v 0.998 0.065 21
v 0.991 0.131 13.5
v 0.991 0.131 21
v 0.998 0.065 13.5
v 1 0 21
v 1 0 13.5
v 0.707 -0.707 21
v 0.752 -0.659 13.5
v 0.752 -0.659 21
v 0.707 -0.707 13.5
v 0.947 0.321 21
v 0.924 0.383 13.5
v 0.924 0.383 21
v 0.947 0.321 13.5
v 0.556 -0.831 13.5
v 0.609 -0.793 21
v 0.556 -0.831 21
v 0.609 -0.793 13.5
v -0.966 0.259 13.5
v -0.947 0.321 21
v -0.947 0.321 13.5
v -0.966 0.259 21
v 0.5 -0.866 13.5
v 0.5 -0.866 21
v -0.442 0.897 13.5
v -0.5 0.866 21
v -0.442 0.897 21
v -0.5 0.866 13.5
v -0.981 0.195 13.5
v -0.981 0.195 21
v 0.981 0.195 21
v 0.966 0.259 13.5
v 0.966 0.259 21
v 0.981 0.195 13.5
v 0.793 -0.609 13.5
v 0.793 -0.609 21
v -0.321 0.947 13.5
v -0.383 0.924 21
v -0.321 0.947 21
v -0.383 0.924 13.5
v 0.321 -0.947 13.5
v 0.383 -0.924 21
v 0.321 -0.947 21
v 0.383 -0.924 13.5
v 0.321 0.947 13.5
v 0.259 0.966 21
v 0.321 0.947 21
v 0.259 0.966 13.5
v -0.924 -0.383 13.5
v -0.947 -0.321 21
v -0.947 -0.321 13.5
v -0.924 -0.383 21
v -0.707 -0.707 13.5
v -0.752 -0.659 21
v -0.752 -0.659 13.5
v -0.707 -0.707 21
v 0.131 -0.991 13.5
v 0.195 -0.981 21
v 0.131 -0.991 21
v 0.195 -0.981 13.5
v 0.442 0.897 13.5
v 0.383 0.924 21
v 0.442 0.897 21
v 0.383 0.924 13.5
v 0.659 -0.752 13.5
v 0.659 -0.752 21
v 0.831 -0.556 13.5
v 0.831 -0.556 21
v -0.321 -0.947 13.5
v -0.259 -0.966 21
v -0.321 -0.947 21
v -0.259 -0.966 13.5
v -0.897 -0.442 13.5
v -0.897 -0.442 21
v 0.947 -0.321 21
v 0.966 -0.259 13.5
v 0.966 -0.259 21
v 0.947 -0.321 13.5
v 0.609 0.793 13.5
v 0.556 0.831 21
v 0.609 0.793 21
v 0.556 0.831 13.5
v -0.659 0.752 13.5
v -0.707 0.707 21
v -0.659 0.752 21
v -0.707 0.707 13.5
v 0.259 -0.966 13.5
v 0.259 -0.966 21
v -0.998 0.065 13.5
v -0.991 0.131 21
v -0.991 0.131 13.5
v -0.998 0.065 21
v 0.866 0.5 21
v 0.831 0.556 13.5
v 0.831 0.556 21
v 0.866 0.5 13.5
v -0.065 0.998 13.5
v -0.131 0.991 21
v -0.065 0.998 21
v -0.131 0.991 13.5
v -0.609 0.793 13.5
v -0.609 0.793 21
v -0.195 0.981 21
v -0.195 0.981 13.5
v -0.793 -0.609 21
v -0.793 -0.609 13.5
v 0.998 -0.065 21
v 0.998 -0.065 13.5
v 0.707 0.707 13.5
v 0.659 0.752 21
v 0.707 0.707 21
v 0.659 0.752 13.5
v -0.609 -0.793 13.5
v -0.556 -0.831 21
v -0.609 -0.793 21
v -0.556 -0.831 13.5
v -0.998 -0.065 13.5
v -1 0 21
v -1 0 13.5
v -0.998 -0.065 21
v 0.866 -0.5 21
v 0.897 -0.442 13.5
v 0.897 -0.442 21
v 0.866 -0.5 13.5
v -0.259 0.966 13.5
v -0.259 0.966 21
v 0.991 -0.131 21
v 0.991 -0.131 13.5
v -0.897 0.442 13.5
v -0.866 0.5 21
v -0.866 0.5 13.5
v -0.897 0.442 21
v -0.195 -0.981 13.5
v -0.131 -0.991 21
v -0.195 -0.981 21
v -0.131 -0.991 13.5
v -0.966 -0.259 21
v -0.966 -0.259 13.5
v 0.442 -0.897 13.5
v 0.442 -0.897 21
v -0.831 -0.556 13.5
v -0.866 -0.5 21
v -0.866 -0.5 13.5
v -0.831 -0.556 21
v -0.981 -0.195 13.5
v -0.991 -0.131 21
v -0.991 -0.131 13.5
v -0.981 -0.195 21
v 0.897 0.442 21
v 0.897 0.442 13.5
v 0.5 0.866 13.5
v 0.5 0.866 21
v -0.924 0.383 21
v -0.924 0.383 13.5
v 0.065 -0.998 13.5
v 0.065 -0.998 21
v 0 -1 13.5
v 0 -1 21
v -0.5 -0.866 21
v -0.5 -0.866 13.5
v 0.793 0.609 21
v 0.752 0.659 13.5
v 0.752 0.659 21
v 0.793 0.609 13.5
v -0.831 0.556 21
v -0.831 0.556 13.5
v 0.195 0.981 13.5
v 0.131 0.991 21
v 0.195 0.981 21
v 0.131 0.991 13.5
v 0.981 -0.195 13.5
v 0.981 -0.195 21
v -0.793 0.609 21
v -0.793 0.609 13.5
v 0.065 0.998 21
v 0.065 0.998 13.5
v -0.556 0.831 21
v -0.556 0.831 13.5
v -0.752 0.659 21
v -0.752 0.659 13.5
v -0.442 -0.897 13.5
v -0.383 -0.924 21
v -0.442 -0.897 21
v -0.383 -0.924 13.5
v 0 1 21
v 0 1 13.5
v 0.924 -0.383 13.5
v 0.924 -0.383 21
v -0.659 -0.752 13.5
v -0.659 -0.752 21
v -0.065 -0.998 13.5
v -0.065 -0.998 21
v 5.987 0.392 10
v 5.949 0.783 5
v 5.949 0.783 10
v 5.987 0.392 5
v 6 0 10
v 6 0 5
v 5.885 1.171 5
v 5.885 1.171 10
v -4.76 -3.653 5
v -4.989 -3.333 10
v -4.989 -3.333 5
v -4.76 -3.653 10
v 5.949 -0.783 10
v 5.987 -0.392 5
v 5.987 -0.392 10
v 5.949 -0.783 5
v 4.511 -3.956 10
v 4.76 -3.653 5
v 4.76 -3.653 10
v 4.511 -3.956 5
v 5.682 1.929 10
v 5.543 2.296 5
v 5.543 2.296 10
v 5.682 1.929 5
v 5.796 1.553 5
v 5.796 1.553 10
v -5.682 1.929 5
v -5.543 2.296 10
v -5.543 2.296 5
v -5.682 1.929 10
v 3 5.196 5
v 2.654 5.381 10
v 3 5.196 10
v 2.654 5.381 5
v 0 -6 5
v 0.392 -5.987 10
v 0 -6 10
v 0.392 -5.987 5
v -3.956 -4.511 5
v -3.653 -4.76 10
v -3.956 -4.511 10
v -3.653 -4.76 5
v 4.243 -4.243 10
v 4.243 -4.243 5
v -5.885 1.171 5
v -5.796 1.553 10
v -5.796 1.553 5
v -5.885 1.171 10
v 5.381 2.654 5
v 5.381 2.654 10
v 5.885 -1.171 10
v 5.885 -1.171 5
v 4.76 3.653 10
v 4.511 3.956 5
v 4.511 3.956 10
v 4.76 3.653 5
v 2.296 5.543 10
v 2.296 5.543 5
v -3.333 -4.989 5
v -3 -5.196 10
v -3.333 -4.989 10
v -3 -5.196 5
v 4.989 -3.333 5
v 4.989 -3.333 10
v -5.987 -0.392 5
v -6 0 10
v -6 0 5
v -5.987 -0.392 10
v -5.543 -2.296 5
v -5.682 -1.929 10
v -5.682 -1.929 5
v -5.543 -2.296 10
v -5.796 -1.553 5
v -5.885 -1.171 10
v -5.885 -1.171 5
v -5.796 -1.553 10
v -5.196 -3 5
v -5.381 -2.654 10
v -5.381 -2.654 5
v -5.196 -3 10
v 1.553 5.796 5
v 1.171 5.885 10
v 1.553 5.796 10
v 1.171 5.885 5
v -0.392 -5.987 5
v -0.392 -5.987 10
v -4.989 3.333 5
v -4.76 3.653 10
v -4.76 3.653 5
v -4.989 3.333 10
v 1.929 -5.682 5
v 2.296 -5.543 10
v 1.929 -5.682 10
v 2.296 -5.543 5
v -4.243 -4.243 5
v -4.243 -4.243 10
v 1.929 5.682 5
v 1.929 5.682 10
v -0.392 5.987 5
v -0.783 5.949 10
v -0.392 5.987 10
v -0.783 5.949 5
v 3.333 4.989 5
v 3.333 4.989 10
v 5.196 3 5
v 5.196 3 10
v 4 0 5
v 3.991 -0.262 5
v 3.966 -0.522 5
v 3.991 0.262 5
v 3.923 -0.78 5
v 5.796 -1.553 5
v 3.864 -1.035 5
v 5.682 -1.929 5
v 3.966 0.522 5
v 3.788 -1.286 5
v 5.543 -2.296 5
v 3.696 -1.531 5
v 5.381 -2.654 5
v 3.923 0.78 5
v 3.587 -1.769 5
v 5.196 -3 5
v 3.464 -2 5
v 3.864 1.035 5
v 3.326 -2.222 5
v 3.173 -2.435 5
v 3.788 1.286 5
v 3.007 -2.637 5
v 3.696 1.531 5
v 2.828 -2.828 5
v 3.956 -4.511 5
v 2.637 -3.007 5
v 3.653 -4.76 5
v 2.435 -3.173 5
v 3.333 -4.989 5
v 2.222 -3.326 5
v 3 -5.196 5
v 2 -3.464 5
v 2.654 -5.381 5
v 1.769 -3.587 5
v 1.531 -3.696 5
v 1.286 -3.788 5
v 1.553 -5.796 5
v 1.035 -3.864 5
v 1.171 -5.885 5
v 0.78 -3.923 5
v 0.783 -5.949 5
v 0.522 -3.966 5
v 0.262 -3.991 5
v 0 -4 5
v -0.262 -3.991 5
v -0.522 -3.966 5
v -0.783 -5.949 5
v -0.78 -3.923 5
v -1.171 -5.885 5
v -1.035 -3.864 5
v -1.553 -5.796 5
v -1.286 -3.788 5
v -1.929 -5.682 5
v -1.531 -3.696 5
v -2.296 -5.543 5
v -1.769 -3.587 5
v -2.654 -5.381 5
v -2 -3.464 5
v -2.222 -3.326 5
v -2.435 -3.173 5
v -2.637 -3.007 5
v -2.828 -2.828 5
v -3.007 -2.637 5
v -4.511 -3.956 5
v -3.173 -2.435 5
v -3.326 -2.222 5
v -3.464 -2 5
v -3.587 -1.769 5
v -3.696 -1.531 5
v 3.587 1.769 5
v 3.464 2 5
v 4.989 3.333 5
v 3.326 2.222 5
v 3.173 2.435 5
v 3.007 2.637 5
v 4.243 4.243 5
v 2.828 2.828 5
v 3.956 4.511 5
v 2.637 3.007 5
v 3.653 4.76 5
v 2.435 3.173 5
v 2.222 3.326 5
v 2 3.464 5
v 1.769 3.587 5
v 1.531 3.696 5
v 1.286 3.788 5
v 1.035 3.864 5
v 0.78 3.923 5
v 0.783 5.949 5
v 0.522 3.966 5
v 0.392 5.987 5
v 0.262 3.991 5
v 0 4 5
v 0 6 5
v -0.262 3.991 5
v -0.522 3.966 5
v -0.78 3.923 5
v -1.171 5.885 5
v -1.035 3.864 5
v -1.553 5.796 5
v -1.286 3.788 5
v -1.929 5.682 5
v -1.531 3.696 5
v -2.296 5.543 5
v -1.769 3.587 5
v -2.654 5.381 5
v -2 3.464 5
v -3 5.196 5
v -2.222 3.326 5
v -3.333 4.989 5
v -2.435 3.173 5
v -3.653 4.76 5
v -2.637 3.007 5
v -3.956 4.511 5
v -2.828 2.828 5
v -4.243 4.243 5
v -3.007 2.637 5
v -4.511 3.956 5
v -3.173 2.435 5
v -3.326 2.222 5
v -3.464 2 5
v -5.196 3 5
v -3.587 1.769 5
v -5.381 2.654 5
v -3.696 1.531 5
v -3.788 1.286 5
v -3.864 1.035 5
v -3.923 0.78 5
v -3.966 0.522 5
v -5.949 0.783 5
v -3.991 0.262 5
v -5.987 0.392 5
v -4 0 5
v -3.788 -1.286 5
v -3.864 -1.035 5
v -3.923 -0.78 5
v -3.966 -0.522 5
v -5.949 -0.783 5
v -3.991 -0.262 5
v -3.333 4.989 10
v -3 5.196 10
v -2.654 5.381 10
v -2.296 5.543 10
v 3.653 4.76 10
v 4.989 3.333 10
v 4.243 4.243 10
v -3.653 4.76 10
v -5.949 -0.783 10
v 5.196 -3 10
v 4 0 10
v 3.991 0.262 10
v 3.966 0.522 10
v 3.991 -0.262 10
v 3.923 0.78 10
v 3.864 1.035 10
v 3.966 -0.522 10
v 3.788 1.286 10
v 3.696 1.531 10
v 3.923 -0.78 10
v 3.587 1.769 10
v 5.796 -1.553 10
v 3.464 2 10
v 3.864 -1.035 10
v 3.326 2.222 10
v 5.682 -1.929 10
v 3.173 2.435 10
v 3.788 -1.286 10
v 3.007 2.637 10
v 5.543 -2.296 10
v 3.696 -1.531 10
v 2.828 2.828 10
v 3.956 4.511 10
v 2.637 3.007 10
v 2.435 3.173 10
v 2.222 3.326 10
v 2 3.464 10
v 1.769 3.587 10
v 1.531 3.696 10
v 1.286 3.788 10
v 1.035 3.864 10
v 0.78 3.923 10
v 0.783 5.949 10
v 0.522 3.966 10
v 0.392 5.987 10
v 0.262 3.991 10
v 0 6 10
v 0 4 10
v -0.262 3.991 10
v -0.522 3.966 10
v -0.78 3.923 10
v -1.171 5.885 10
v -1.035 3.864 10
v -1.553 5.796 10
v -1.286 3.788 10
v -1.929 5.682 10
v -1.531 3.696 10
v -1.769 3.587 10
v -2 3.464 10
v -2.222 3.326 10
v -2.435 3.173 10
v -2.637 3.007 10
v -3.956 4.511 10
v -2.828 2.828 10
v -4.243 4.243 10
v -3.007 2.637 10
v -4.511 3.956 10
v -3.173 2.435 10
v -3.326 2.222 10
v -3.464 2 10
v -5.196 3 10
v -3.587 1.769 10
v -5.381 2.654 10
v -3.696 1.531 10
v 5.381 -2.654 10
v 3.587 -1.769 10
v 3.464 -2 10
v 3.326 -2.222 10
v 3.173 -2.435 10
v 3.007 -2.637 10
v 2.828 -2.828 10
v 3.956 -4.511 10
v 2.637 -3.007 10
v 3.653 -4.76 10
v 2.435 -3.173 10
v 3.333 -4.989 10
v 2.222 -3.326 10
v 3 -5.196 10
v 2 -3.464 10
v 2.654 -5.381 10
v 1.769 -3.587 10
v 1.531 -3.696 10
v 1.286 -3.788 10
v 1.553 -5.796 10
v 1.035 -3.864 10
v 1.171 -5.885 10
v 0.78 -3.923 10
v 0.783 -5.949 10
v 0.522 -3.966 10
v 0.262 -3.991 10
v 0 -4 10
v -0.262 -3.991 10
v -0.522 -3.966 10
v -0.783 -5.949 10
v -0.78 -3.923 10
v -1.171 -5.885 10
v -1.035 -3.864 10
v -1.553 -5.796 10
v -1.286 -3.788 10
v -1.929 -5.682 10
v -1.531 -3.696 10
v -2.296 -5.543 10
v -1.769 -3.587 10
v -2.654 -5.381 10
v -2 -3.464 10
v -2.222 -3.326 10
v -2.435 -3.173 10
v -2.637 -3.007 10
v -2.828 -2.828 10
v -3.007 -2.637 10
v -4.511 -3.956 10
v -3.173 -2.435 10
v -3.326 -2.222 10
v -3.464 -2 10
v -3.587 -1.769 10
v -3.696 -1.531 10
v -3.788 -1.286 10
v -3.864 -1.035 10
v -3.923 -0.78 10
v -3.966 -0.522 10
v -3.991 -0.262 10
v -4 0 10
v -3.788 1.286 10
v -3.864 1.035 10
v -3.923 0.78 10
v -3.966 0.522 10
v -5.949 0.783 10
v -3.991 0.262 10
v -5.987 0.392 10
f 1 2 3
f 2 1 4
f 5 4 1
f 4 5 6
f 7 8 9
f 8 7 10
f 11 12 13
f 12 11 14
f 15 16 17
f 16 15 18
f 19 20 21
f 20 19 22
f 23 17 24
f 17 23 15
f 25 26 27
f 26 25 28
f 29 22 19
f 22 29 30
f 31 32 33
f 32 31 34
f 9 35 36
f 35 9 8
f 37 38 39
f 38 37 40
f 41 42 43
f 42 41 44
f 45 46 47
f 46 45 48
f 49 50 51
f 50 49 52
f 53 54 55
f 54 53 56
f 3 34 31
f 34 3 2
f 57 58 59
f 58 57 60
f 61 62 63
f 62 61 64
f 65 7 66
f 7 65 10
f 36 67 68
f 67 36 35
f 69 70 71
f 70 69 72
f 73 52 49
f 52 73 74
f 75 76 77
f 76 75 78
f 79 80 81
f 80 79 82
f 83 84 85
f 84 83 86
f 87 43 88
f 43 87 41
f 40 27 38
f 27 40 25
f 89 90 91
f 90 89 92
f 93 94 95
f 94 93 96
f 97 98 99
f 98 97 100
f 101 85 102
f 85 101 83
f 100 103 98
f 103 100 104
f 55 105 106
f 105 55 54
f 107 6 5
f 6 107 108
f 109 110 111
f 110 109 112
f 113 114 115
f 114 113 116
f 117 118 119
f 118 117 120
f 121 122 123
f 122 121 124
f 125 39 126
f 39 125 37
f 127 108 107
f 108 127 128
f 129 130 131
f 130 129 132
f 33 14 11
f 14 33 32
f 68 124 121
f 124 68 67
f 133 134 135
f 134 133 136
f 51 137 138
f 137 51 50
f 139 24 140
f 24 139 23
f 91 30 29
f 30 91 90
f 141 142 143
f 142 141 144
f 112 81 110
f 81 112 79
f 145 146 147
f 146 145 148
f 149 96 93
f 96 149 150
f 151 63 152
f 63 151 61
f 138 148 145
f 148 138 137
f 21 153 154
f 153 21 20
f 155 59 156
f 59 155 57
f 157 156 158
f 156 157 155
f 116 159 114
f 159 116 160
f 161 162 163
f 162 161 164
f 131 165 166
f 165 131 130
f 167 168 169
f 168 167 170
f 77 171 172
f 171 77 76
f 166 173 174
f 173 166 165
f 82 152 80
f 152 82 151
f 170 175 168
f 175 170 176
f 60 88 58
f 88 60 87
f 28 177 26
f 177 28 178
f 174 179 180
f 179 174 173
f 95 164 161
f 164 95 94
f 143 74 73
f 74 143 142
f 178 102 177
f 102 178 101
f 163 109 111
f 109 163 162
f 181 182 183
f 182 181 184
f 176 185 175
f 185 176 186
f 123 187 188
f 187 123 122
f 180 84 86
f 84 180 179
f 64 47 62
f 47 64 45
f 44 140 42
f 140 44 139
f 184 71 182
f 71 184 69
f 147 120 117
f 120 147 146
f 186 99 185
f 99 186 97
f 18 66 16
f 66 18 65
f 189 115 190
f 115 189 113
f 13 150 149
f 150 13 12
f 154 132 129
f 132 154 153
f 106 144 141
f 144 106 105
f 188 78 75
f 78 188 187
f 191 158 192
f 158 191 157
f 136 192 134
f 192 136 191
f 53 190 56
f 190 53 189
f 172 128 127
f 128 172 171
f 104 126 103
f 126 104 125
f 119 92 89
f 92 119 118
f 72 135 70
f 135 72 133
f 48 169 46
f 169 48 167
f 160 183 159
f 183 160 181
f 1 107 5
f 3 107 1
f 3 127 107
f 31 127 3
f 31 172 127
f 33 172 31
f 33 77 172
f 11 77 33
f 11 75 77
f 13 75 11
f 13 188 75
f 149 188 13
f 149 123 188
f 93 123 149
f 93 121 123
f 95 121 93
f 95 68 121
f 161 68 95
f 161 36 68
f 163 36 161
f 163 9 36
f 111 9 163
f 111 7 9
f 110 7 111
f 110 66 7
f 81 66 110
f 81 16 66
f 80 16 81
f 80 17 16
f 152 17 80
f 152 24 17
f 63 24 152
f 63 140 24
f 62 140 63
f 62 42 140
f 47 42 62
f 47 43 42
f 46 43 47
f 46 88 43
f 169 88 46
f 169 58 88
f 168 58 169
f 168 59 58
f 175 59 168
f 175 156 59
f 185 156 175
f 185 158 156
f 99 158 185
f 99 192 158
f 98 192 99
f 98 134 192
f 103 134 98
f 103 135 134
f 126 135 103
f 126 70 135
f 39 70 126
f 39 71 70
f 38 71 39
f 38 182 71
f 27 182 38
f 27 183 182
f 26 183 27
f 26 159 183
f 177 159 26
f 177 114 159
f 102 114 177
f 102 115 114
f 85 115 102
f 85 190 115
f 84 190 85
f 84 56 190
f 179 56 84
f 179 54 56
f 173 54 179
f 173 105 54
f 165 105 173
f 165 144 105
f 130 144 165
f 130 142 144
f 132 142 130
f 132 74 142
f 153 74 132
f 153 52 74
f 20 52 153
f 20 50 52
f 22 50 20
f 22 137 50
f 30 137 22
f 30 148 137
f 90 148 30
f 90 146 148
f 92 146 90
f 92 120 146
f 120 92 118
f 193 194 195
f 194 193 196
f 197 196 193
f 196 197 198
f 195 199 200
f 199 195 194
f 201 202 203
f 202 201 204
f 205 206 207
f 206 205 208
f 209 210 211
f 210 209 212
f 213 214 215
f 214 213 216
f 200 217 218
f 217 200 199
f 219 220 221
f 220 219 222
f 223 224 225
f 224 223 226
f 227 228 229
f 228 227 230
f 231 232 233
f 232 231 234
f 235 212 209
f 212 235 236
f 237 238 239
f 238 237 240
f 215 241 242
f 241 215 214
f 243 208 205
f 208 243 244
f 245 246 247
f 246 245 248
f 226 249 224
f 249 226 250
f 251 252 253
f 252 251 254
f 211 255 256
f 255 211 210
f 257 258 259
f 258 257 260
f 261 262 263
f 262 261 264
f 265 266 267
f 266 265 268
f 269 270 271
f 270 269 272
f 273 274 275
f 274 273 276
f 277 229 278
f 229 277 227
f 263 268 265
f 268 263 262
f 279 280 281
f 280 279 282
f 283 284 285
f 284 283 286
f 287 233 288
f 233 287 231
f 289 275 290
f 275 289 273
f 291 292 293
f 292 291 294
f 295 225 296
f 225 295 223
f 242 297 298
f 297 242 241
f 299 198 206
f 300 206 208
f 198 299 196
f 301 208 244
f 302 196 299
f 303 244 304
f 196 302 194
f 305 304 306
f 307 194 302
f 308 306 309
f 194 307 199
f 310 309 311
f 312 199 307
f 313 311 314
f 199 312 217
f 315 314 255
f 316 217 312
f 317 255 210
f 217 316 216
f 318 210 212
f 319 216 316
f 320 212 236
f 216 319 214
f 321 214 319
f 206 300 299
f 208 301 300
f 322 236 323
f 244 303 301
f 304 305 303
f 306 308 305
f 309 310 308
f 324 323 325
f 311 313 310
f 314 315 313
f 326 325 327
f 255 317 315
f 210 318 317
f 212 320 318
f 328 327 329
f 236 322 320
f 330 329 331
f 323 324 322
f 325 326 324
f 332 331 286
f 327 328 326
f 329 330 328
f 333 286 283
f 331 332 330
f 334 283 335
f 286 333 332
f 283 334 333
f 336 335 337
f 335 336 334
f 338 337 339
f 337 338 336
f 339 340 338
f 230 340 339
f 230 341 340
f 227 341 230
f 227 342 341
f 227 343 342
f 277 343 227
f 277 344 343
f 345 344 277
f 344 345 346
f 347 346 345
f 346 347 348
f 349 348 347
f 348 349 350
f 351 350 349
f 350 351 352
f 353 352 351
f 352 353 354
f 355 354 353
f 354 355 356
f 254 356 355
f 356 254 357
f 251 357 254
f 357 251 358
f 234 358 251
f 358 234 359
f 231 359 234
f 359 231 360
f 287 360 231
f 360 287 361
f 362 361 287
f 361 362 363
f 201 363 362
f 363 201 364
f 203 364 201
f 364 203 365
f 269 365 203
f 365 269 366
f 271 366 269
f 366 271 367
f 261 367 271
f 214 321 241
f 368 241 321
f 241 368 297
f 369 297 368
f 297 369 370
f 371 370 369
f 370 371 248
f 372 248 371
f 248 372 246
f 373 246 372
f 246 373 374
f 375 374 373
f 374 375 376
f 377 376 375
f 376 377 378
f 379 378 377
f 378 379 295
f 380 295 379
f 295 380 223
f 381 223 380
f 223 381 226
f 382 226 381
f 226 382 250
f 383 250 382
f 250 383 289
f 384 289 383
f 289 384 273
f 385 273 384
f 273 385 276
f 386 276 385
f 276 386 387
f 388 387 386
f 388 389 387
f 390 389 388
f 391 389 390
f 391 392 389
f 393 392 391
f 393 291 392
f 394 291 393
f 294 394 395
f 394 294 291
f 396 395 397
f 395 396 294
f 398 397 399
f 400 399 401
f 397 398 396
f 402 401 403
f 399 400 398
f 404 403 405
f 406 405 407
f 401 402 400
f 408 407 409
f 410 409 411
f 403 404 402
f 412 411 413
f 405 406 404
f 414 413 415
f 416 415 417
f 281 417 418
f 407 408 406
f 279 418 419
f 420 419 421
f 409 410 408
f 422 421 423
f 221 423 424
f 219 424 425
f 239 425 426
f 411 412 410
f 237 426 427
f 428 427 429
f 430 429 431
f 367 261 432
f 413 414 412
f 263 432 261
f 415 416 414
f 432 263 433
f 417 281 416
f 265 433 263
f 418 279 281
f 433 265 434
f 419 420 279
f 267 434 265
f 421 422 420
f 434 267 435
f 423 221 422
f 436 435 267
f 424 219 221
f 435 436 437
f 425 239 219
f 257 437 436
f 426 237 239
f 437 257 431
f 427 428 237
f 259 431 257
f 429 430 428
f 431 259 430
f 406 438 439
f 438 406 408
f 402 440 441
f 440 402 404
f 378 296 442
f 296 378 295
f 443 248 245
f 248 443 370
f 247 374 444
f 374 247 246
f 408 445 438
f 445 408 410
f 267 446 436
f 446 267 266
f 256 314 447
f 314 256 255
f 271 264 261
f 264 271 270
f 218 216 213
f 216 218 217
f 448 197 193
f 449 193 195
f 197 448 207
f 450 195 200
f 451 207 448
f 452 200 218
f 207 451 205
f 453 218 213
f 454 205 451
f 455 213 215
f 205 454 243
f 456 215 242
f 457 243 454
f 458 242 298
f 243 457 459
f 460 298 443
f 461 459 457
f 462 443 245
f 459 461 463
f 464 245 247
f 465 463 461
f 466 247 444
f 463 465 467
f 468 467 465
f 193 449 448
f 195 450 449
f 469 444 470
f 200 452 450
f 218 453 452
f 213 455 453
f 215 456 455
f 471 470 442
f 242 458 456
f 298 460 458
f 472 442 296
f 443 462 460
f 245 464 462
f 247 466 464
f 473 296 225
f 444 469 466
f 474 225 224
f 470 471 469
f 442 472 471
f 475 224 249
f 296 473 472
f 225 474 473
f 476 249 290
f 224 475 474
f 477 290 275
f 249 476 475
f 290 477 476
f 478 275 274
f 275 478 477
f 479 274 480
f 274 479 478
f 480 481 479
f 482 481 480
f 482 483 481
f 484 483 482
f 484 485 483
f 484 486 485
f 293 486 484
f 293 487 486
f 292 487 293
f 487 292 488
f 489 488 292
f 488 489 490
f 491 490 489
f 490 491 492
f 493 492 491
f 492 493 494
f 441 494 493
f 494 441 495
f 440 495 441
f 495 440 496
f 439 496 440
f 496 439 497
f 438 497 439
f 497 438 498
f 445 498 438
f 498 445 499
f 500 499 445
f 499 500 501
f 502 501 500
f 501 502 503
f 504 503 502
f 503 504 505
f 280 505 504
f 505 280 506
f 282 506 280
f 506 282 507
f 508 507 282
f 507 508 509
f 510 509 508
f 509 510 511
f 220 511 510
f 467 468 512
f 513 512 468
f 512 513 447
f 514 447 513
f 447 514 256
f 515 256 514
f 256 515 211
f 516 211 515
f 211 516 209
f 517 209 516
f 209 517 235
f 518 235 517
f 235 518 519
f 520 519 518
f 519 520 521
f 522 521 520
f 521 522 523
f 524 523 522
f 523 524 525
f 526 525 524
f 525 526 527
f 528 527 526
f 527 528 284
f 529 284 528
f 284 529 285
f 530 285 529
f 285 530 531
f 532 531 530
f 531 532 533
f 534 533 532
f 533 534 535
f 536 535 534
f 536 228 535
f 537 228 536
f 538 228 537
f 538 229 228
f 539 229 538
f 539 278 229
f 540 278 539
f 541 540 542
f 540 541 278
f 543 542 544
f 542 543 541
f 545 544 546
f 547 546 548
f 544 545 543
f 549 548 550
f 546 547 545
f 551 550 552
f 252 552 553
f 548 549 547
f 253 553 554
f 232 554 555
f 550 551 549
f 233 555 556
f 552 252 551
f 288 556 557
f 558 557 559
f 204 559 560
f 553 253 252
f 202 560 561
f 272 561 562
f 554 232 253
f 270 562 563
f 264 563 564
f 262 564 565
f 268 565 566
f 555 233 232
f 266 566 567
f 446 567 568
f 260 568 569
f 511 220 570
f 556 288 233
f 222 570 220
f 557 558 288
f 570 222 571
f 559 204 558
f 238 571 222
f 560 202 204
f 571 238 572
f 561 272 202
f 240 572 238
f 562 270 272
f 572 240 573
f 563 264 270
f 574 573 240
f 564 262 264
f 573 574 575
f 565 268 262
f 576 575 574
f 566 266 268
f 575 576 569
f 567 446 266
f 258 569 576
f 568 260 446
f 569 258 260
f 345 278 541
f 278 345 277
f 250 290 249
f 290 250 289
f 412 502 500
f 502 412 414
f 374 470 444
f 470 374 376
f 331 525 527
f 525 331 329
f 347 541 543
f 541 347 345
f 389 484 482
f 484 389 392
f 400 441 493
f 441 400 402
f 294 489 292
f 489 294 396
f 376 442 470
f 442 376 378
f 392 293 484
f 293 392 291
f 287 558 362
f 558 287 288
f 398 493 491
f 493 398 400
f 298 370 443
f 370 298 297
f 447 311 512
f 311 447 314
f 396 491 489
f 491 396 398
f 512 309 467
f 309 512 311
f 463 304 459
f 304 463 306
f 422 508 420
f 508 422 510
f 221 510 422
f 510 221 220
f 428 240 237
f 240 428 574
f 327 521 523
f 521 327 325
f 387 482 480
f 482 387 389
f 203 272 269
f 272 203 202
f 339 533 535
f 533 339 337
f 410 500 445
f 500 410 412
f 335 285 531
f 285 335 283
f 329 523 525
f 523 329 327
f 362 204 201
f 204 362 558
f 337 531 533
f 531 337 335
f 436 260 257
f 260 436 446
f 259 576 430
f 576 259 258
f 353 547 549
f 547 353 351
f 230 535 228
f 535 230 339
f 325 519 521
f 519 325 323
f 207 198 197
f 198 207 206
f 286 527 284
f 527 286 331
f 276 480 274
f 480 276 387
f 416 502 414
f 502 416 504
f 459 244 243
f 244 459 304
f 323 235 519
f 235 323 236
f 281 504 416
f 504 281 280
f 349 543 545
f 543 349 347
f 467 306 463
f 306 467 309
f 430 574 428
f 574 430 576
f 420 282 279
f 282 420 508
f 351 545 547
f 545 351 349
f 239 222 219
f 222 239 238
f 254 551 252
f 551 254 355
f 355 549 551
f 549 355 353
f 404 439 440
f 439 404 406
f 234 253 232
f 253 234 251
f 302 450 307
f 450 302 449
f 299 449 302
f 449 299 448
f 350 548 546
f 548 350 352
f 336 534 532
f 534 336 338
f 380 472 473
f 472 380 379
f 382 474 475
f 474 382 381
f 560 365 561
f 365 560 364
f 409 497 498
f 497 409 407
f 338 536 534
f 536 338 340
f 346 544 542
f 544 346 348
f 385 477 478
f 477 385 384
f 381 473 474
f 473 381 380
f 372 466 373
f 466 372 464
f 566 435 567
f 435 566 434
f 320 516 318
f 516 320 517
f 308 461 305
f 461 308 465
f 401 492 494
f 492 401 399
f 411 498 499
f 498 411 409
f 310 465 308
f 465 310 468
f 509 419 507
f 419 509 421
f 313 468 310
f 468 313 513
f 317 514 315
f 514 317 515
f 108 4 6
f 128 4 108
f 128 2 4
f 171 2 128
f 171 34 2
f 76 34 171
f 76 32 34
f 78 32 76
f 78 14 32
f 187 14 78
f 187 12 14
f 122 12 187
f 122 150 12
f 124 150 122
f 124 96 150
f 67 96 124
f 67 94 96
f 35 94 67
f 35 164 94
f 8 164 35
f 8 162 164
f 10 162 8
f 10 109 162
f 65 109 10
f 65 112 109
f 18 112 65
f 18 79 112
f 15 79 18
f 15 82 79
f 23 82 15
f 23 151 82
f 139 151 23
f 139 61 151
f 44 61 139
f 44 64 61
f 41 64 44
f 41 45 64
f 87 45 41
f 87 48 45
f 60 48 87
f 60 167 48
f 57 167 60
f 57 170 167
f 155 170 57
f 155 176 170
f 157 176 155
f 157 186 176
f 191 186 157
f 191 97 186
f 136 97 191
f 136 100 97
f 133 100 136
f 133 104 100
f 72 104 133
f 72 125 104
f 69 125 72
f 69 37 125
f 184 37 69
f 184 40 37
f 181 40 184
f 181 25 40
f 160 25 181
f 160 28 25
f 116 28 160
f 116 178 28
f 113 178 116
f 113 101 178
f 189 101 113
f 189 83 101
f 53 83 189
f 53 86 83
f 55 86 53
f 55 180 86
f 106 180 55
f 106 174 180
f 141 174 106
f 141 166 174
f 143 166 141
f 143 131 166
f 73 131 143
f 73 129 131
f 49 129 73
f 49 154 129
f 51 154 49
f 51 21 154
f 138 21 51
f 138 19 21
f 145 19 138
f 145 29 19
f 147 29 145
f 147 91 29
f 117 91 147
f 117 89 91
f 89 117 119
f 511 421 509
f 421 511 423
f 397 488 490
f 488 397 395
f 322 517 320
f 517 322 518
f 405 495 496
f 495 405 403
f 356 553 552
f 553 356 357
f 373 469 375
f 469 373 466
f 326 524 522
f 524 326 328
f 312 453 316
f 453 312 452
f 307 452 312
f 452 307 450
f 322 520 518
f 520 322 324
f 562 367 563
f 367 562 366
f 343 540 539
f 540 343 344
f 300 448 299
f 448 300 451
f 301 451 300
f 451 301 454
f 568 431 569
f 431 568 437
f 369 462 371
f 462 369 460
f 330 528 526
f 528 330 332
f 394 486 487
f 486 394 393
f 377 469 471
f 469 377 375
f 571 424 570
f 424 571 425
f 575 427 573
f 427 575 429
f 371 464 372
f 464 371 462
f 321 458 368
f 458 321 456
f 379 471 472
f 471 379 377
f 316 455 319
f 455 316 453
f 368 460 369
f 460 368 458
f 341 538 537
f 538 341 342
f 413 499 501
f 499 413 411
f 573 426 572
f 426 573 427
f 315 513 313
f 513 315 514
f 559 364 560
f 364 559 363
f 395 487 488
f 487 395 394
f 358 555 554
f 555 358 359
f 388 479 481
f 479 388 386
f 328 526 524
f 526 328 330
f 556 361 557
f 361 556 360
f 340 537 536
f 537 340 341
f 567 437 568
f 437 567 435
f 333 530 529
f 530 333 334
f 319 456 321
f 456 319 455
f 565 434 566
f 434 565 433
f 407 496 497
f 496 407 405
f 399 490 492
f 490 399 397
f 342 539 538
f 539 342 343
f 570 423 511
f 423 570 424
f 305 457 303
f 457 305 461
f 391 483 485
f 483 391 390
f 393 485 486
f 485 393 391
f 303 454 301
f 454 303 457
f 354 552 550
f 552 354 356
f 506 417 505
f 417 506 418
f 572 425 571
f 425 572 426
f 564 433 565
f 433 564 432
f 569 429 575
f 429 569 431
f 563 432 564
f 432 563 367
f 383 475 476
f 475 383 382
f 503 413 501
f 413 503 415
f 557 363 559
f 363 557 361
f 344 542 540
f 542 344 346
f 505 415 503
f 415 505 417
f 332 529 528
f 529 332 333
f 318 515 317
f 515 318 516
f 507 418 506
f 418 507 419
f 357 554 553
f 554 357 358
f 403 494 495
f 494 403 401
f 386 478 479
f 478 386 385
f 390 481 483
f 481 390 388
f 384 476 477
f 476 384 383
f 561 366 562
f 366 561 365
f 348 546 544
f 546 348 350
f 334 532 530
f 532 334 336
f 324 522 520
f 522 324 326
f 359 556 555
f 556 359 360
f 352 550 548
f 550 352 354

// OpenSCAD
// Hose-barb reducer: joins 8 mm ID tubing to 5 mm ID tubing
// Print orientation: standing upright along Z
// Units: mm

// ---------------- Parameters ----------------
reducer_id      = 8;     // central bore diameter (through)
tube_large_id   = 8;     // inner diameter of larger tubing
tube_small_id   = 5;     // inner diameter of smaller tubing
barb_large_od   = 9.5;   // outer diameter of large-tubing barb (tip)
barb_small_od   = 5.0;   // outer diameter of small-tubing barb (tip)
barb_count      = 2;     // number of barbs per end, stacked
barb_length     = 10;    // height of each barb (large)
barb_small_len  = 8;     // height of each barb (small)
collar_d        = 12;    // outer diameter of coupling collar
collar_h        = 5;     // collar height (overlaps barbs for a solid union)
eps             = 0.5;   // cutter overshoot past faces
$fn             = 96;    // curve resolution

// Derived
barb_root_od = barb_large_od - 0.5;   // diameter where barb meets tube (simplified wall)

// ---------------- Model ----------------
difference() {
    union() {
        // End A: two barbs for the 8 mm tubing (z = 0 to 20)
        for (i = [0 : barb_count - 1])
            translate([0, 0, i * barb_length])
                cylinder(h = barb_length, r = [barb_root_od, barb_large_od]);

        // End B: two barbs for the 5 mm tubing (z = 25 to 33)
        for (i = [0 : barb_count - 1])
            translate([0, 0, collar_h + i * barb_small_len])
                cylinder(h = barb_small_len, r = [barb_small_od, barb_small_od + 0.5]);

        // Central collar (z = 20 to 25): fuses the two barb sets
        translate([0, 0, collar_h])
            cylinder(h = collar_h, d = collar_d);
    }

    // Straight through-bore from z = -eps to z = collar_h + barb_small_len + eps
    translate([0, 0, -eps])
        cylinder(h = collar_h + barb_small_len + 2 * eps, d = reducer_id);
}
